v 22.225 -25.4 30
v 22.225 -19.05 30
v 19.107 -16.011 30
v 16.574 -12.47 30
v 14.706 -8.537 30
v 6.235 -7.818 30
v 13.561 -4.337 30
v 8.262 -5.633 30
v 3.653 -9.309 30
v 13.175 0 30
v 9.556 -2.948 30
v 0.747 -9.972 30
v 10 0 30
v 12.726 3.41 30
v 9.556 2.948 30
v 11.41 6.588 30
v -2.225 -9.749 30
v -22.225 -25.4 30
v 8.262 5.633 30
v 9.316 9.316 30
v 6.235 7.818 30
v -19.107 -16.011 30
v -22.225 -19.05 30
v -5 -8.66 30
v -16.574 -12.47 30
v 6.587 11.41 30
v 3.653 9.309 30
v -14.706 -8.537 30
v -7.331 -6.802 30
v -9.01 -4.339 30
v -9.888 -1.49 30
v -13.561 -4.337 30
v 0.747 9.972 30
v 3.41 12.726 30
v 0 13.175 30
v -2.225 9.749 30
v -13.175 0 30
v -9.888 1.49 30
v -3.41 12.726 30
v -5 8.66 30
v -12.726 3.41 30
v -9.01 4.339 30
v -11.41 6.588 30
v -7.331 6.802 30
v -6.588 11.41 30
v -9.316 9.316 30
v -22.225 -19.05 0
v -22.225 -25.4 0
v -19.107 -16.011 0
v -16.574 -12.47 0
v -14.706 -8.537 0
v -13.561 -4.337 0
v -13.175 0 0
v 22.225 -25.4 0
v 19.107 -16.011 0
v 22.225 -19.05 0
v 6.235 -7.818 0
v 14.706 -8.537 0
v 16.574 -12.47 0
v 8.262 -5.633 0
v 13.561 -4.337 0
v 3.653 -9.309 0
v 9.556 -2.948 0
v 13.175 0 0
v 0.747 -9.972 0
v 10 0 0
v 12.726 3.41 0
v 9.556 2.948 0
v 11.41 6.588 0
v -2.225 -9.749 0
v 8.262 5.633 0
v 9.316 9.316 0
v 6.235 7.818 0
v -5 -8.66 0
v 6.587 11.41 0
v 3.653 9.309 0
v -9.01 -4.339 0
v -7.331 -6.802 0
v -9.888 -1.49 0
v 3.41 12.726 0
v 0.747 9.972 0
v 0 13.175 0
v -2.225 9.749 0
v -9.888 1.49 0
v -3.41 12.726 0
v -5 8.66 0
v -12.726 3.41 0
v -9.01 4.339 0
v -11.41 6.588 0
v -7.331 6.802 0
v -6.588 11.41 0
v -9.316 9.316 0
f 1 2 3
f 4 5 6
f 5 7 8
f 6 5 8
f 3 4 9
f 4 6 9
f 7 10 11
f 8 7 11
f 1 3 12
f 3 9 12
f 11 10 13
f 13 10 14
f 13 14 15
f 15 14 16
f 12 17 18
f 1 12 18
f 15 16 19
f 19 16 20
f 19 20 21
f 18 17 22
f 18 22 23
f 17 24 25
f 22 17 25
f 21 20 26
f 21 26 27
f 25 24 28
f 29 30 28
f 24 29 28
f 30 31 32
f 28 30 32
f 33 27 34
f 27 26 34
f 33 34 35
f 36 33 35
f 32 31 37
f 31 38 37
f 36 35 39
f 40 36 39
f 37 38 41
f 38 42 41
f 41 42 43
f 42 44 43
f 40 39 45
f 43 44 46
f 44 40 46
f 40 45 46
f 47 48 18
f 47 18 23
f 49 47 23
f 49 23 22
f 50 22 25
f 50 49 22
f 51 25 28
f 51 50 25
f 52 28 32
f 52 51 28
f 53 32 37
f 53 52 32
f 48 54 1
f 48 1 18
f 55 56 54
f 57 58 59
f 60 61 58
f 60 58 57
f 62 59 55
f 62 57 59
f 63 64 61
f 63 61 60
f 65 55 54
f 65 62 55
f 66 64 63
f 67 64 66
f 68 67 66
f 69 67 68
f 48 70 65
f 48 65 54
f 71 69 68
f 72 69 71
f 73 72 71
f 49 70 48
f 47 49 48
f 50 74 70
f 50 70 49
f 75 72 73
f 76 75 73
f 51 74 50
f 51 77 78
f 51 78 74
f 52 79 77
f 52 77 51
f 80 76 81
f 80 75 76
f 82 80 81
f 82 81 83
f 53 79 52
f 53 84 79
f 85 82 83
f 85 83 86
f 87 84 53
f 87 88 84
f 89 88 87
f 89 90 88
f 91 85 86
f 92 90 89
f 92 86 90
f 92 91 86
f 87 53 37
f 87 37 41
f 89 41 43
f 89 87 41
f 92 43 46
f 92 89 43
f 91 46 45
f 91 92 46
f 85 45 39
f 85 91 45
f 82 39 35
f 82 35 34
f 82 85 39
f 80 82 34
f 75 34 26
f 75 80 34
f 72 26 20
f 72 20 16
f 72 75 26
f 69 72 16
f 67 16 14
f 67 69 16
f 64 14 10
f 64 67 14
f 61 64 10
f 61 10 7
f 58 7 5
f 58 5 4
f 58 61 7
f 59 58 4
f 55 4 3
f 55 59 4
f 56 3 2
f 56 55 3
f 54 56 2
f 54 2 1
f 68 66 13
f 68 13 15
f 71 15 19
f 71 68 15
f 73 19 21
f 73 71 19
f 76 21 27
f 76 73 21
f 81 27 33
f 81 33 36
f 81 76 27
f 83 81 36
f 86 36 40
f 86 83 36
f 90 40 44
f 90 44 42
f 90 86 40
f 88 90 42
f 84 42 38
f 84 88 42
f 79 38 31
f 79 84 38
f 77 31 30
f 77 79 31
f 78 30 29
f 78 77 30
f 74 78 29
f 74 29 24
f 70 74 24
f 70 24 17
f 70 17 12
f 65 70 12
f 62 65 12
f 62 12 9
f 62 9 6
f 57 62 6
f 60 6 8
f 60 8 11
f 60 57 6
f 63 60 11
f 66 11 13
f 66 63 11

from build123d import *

# Parameters (mm, degrees)
SKETCH1_R           = 10
BOSS_EXTRUDE1_DEPTH = 30


with BuildPart() as part:
    # Sketch1 → Boss-Extrude1 (new body)
    with BuildSketch(Plane.XY):
        with BuildLine():
            ThreePointArc((13.175, 0), (15.552506488, -10.54520033), (22.225, -19.05))
            Line((22.225, -19.05), (22.225, -25.4))
            Line((22.225, -25.4), (-22.225, -25.4))
            Line((-22.225, -25.4), (-22.225, -19.05))
            ThreePointArc((-22.225, -19.05), (-15.552506488, -10.54520033), (-13.175, 0))
            ThreePointArc((-13.175, 0), (0, 13.175), (13.175, 0))
        make_face()
        Circle(SKETCH1_R, mode=Mode.SUBTRACT)
    extrude(amount=BOSS_EXTRUDE1_DEPTH)


solid = part.part
